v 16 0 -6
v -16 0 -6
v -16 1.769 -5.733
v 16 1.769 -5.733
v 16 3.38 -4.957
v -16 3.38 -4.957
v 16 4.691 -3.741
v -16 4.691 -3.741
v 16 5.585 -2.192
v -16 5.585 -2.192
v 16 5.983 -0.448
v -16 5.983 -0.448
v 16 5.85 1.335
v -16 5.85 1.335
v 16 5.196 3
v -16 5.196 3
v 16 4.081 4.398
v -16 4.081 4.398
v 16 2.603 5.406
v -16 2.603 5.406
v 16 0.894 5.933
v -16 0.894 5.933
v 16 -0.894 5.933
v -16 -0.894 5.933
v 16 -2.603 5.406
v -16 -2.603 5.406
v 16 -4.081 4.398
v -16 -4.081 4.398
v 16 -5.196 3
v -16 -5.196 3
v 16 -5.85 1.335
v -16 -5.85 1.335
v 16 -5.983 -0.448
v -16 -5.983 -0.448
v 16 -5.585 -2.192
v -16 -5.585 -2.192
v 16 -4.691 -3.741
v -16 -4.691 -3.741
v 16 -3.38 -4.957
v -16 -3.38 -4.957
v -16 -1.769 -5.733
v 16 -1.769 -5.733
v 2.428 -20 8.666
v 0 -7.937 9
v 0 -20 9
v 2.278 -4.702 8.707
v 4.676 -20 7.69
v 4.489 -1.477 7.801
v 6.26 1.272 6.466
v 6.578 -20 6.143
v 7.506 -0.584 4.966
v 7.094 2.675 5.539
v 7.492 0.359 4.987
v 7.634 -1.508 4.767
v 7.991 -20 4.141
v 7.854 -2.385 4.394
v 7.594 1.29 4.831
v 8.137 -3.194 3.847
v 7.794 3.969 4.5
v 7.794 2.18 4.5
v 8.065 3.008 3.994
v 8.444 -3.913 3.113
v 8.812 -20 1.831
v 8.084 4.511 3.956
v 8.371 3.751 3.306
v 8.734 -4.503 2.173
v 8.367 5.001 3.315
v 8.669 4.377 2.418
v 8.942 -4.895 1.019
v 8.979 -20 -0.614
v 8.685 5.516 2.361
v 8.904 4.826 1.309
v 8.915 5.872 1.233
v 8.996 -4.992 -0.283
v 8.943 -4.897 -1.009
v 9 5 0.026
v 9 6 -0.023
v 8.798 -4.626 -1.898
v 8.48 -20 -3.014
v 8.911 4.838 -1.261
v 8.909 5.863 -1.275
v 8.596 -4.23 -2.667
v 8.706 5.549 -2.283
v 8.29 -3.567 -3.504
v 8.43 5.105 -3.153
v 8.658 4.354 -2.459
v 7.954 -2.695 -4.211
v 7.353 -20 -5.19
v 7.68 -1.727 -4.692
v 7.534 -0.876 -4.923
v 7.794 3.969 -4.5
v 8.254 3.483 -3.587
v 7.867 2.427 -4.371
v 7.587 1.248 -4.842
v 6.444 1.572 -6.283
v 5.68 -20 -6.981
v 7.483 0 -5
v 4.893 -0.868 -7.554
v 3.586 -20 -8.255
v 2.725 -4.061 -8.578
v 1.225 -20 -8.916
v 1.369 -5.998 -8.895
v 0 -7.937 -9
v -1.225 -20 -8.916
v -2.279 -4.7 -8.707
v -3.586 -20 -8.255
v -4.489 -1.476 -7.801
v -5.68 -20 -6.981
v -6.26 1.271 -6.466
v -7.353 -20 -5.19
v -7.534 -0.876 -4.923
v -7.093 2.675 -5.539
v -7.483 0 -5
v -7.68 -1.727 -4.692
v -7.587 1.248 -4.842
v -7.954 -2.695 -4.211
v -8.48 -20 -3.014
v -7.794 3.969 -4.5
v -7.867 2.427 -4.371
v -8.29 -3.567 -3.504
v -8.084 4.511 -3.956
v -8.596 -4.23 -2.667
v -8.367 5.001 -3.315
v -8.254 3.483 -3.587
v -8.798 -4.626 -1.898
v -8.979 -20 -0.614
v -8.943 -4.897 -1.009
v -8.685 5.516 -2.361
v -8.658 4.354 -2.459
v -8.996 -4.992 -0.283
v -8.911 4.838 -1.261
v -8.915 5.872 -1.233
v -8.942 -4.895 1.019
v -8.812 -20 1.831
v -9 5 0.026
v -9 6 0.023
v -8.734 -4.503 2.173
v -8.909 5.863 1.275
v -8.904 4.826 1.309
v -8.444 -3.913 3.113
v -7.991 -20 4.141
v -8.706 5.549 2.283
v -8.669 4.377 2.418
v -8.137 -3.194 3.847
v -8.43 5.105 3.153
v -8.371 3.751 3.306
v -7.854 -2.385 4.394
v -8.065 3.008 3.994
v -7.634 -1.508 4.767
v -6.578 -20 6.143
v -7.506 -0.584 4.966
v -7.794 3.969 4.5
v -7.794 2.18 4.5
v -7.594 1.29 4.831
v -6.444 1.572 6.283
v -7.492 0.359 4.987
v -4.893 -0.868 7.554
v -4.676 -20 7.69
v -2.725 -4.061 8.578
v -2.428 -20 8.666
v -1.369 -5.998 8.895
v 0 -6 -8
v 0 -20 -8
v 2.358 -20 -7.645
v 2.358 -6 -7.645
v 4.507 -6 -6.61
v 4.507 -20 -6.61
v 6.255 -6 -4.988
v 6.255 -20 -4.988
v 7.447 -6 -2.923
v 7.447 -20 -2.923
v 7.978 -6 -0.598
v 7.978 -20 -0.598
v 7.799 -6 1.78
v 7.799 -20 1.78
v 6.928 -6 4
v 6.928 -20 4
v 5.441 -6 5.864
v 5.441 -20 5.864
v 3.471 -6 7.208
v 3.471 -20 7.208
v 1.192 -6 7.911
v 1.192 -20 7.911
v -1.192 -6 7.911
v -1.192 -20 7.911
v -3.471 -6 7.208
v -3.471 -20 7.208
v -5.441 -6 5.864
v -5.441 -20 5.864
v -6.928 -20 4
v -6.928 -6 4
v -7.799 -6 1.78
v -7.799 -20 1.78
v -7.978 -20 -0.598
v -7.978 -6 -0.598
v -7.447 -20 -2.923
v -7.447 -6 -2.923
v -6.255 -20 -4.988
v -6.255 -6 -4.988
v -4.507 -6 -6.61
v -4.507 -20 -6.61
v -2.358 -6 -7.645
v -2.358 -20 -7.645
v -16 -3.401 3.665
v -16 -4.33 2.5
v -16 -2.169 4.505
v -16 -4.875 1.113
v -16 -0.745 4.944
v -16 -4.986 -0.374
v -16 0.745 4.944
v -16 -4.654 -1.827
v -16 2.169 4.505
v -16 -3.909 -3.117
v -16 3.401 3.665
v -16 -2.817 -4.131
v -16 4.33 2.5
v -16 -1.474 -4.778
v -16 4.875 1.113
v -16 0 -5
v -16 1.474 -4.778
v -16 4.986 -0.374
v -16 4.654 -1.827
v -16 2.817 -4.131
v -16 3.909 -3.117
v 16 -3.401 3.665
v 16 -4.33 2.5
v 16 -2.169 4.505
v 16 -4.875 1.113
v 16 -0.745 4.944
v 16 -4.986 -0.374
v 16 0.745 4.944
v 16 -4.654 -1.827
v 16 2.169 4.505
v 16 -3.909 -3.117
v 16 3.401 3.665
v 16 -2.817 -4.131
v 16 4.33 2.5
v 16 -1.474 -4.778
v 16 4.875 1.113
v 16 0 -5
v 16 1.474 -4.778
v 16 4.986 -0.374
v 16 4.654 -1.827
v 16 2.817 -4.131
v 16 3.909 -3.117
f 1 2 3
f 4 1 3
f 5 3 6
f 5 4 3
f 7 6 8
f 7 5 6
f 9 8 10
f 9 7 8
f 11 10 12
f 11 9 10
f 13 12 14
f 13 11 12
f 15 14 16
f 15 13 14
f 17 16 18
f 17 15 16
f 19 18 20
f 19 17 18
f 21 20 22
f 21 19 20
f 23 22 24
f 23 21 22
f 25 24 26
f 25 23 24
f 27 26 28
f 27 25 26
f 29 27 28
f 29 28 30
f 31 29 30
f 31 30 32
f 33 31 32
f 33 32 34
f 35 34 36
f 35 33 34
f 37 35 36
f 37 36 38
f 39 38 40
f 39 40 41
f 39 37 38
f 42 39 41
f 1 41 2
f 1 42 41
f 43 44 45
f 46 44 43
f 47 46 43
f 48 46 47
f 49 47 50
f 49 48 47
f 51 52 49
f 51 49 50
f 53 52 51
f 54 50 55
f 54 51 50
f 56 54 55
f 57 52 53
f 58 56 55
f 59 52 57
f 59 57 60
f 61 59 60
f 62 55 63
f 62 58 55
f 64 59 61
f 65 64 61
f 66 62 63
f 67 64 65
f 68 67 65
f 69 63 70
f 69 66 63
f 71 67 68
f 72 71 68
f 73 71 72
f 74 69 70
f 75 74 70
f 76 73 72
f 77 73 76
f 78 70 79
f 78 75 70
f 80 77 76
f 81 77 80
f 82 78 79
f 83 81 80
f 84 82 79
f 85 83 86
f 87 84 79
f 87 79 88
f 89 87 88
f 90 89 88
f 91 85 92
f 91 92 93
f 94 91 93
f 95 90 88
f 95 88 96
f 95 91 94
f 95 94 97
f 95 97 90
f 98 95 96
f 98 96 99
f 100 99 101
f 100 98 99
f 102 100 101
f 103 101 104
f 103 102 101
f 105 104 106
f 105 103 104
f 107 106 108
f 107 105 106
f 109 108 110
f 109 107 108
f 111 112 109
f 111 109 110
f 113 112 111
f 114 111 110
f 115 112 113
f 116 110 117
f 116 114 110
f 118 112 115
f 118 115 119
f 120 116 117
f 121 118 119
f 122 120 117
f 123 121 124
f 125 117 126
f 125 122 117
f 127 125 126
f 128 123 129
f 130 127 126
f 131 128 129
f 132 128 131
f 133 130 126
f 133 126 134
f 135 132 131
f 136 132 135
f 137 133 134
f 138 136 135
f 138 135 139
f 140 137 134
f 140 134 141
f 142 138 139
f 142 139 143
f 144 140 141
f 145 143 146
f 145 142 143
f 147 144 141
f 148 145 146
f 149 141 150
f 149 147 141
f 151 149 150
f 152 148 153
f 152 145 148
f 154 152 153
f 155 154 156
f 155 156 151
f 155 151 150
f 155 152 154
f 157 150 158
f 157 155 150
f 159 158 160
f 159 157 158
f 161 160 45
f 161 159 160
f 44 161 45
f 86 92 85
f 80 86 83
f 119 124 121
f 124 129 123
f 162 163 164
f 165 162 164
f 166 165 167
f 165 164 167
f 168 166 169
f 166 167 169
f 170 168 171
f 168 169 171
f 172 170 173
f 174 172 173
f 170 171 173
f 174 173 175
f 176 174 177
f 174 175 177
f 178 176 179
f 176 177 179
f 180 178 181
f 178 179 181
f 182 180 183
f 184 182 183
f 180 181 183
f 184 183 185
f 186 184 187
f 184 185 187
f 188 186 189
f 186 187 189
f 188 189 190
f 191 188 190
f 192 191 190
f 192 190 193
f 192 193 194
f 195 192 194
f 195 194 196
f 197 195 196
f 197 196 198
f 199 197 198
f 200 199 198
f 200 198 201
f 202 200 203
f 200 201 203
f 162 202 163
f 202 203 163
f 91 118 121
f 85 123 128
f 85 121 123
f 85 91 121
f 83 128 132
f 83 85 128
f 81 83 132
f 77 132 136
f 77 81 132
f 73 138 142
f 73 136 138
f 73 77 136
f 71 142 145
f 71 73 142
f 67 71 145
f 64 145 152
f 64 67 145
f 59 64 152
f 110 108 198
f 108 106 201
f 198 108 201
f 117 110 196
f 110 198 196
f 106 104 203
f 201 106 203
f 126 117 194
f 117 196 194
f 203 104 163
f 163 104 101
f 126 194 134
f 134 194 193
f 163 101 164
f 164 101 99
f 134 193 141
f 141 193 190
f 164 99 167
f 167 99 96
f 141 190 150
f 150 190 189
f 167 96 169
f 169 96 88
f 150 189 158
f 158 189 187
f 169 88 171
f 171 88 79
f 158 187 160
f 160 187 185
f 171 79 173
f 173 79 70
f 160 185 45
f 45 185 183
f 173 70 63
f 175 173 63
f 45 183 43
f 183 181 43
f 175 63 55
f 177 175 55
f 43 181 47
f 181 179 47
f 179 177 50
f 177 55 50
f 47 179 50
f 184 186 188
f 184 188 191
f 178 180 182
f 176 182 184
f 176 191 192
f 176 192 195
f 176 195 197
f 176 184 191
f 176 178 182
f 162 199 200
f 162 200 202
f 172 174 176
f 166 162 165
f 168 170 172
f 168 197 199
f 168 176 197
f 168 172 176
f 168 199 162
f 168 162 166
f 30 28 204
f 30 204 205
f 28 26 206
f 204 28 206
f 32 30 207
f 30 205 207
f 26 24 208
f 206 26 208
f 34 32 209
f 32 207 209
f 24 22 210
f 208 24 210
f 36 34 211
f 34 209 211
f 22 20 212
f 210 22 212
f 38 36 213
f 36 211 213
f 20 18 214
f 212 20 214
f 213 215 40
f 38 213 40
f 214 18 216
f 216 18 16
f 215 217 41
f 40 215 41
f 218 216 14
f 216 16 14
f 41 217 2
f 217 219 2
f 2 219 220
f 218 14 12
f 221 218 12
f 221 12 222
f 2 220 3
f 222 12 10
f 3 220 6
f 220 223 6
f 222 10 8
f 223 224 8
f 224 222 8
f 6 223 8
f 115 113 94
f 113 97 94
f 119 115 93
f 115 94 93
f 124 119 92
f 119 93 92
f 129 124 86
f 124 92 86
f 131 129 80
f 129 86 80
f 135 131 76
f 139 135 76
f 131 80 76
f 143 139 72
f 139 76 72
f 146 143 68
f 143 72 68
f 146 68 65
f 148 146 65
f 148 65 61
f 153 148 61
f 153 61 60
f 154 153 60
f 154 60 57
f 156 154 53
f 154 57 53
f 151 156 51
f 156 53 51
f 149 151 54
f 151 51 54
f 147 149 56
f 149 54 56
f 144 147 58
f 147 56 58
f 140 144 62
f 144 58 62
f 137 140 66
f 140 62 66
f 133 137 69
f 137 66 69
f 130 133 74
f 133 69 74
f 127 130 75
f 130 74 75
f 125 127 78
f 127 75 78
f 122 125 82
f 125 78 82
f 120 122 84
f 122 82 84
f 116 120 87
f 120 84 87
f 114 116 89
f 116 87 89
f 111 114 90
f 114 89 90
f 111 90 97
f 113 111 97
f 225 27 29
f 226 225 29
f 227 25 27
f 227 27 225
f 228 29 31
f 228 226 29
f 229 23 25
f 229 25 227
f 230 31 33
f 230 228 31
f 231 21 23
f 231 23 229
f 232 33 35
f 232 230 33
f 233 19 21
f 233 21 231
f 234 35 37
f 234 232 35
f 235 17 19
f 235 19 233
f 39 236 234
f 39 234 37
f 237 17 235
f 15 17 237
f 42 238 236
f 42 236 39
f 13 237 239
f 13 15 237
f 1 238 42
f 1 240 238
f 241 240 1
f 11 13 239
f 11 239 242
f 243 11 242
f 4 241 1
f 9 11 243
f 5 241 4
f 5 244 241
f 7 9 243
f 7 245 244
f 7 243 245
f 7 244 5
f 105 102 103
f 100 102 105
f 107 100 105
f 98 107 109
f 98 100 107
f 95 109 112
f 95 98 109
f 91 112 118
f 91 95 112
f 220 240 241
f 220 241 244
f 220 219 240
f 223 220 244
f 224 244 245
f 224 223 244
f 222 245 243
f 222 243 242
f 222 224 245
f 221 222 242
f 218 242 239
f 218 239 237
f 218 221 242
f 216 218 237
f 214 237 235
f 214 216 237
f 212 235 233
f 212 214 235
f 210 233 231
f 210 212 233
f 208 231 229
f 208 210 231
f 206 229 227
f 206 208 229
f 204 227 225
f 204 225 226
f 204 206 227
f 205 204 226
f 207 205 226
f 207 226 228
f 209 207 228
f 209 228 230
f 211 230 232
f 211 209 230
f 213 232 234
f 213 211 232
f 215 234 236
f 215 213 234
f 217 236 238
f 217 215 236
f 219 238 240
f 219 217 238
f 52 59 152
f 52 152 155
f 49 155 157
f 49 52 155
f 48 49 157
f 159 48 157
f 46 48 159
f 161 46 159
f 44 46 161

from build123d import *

# Parameters (mm, degrees)
SKETCH_1_R          = 6
SKETCH_1_R_2        = 5
EXTRUDE_1_DEPTH     = 16
SKETCH_3_R          = 9
EXTRUDE_2_DEPTH     = 26
SKETCH_4_R          = 8
CUT_EXTRUDE_1_DEPTH = 14
SKETCH_6_R          = 5
CUT_EXTRUDE_2_DEPTH = 12.5
CUT_EXTRUDE_3_DEPTH = 12.5


with BuildPart() as part:
    # 草图1 → 凸台-拉伸1 (new, symmetric)
    with BuildSketch(Plane(origin=(0, 0, 0), x_dir=(0, 0, -1), z_dir=(1, 0, 0))):
        Circle(SKETCH_1_R)
        Circle(SKETCH_1_R_2, mode=Mode.SUBTRACT)
    extrude(amount=EXTRUDE_1_DEPTH, both=True)


with BuildPart() as body_2:
    # 草图3 → 凸台-拉伸2 (new body)
    with BuildSketch(Plane(origin=(0, 6, 0), x_dir=(1, 0, 0), z_dir=(0, 1, 0))):
        with Locations(Location((0, 0, 0), (0, 0, 270))):
            Circle(SKETCH_3_R)
    extrude(amount=-EXTRUDE_2_DEPTH)

    # 草图4 → 切除-拉伸1 (cut)
    with BuildSketch(Plane(origin=(0, -20, 0), x_dir=(-1, 0, 0), z_dir=(0, -1, 0))):
        with Locations(Location((0, 0, 0), (0, 0, 90))):
            Circle(SKETCH_4_R)
    extrude(amount=-CUT_EXTRUDE_1_DEPTH, mode=Mode.SUBTRACT)

    # 草图6 → 切除-拉伸2 (cut, symmetric)
    with BuildSketch(Plane(origin=(0, 0, 0), x_dir=(0, 0, -1), z_dir=(1, 0, 0))):
        Circle(SKETCH_6_R)
    extrude(amount=CUT_EXTRUDE_2_DEPTH, both=True, mode=Mode.SUBTRACT)

    # 草图7 → 切除-拉伸3 (cut, symmetric)
    with BuildSketch(Plane(origin=(0, 0, 0), x_dir=(0, 0, -1), z_dir=(1, 0, 0))):
        with BuildLine():
            Line((9, 8), (9, -7.937253933))
            ThreePointArc((9, -7.937253933), (7.83745824, -1.573292903), (4.5, 3.968626967))
            ThreePointArc((4.5, 3.968626967), (0, 6), (-4.5, 3.968626967))
            ThreePointArc((-4.5, 3.968626967), (-7.83745824, -1.573292903), (-9, -7.937253933))
            Line((-9, -7.937253933), (-9, 8))
            Line((-9, 8), (9, 8))
        make_face()
    extrude(amount=CUT_EXTRUDE_3_DEPTH, both=True, mode=Mode.SUBTRACT)


solid = Compound([part.part, body_2.part])
